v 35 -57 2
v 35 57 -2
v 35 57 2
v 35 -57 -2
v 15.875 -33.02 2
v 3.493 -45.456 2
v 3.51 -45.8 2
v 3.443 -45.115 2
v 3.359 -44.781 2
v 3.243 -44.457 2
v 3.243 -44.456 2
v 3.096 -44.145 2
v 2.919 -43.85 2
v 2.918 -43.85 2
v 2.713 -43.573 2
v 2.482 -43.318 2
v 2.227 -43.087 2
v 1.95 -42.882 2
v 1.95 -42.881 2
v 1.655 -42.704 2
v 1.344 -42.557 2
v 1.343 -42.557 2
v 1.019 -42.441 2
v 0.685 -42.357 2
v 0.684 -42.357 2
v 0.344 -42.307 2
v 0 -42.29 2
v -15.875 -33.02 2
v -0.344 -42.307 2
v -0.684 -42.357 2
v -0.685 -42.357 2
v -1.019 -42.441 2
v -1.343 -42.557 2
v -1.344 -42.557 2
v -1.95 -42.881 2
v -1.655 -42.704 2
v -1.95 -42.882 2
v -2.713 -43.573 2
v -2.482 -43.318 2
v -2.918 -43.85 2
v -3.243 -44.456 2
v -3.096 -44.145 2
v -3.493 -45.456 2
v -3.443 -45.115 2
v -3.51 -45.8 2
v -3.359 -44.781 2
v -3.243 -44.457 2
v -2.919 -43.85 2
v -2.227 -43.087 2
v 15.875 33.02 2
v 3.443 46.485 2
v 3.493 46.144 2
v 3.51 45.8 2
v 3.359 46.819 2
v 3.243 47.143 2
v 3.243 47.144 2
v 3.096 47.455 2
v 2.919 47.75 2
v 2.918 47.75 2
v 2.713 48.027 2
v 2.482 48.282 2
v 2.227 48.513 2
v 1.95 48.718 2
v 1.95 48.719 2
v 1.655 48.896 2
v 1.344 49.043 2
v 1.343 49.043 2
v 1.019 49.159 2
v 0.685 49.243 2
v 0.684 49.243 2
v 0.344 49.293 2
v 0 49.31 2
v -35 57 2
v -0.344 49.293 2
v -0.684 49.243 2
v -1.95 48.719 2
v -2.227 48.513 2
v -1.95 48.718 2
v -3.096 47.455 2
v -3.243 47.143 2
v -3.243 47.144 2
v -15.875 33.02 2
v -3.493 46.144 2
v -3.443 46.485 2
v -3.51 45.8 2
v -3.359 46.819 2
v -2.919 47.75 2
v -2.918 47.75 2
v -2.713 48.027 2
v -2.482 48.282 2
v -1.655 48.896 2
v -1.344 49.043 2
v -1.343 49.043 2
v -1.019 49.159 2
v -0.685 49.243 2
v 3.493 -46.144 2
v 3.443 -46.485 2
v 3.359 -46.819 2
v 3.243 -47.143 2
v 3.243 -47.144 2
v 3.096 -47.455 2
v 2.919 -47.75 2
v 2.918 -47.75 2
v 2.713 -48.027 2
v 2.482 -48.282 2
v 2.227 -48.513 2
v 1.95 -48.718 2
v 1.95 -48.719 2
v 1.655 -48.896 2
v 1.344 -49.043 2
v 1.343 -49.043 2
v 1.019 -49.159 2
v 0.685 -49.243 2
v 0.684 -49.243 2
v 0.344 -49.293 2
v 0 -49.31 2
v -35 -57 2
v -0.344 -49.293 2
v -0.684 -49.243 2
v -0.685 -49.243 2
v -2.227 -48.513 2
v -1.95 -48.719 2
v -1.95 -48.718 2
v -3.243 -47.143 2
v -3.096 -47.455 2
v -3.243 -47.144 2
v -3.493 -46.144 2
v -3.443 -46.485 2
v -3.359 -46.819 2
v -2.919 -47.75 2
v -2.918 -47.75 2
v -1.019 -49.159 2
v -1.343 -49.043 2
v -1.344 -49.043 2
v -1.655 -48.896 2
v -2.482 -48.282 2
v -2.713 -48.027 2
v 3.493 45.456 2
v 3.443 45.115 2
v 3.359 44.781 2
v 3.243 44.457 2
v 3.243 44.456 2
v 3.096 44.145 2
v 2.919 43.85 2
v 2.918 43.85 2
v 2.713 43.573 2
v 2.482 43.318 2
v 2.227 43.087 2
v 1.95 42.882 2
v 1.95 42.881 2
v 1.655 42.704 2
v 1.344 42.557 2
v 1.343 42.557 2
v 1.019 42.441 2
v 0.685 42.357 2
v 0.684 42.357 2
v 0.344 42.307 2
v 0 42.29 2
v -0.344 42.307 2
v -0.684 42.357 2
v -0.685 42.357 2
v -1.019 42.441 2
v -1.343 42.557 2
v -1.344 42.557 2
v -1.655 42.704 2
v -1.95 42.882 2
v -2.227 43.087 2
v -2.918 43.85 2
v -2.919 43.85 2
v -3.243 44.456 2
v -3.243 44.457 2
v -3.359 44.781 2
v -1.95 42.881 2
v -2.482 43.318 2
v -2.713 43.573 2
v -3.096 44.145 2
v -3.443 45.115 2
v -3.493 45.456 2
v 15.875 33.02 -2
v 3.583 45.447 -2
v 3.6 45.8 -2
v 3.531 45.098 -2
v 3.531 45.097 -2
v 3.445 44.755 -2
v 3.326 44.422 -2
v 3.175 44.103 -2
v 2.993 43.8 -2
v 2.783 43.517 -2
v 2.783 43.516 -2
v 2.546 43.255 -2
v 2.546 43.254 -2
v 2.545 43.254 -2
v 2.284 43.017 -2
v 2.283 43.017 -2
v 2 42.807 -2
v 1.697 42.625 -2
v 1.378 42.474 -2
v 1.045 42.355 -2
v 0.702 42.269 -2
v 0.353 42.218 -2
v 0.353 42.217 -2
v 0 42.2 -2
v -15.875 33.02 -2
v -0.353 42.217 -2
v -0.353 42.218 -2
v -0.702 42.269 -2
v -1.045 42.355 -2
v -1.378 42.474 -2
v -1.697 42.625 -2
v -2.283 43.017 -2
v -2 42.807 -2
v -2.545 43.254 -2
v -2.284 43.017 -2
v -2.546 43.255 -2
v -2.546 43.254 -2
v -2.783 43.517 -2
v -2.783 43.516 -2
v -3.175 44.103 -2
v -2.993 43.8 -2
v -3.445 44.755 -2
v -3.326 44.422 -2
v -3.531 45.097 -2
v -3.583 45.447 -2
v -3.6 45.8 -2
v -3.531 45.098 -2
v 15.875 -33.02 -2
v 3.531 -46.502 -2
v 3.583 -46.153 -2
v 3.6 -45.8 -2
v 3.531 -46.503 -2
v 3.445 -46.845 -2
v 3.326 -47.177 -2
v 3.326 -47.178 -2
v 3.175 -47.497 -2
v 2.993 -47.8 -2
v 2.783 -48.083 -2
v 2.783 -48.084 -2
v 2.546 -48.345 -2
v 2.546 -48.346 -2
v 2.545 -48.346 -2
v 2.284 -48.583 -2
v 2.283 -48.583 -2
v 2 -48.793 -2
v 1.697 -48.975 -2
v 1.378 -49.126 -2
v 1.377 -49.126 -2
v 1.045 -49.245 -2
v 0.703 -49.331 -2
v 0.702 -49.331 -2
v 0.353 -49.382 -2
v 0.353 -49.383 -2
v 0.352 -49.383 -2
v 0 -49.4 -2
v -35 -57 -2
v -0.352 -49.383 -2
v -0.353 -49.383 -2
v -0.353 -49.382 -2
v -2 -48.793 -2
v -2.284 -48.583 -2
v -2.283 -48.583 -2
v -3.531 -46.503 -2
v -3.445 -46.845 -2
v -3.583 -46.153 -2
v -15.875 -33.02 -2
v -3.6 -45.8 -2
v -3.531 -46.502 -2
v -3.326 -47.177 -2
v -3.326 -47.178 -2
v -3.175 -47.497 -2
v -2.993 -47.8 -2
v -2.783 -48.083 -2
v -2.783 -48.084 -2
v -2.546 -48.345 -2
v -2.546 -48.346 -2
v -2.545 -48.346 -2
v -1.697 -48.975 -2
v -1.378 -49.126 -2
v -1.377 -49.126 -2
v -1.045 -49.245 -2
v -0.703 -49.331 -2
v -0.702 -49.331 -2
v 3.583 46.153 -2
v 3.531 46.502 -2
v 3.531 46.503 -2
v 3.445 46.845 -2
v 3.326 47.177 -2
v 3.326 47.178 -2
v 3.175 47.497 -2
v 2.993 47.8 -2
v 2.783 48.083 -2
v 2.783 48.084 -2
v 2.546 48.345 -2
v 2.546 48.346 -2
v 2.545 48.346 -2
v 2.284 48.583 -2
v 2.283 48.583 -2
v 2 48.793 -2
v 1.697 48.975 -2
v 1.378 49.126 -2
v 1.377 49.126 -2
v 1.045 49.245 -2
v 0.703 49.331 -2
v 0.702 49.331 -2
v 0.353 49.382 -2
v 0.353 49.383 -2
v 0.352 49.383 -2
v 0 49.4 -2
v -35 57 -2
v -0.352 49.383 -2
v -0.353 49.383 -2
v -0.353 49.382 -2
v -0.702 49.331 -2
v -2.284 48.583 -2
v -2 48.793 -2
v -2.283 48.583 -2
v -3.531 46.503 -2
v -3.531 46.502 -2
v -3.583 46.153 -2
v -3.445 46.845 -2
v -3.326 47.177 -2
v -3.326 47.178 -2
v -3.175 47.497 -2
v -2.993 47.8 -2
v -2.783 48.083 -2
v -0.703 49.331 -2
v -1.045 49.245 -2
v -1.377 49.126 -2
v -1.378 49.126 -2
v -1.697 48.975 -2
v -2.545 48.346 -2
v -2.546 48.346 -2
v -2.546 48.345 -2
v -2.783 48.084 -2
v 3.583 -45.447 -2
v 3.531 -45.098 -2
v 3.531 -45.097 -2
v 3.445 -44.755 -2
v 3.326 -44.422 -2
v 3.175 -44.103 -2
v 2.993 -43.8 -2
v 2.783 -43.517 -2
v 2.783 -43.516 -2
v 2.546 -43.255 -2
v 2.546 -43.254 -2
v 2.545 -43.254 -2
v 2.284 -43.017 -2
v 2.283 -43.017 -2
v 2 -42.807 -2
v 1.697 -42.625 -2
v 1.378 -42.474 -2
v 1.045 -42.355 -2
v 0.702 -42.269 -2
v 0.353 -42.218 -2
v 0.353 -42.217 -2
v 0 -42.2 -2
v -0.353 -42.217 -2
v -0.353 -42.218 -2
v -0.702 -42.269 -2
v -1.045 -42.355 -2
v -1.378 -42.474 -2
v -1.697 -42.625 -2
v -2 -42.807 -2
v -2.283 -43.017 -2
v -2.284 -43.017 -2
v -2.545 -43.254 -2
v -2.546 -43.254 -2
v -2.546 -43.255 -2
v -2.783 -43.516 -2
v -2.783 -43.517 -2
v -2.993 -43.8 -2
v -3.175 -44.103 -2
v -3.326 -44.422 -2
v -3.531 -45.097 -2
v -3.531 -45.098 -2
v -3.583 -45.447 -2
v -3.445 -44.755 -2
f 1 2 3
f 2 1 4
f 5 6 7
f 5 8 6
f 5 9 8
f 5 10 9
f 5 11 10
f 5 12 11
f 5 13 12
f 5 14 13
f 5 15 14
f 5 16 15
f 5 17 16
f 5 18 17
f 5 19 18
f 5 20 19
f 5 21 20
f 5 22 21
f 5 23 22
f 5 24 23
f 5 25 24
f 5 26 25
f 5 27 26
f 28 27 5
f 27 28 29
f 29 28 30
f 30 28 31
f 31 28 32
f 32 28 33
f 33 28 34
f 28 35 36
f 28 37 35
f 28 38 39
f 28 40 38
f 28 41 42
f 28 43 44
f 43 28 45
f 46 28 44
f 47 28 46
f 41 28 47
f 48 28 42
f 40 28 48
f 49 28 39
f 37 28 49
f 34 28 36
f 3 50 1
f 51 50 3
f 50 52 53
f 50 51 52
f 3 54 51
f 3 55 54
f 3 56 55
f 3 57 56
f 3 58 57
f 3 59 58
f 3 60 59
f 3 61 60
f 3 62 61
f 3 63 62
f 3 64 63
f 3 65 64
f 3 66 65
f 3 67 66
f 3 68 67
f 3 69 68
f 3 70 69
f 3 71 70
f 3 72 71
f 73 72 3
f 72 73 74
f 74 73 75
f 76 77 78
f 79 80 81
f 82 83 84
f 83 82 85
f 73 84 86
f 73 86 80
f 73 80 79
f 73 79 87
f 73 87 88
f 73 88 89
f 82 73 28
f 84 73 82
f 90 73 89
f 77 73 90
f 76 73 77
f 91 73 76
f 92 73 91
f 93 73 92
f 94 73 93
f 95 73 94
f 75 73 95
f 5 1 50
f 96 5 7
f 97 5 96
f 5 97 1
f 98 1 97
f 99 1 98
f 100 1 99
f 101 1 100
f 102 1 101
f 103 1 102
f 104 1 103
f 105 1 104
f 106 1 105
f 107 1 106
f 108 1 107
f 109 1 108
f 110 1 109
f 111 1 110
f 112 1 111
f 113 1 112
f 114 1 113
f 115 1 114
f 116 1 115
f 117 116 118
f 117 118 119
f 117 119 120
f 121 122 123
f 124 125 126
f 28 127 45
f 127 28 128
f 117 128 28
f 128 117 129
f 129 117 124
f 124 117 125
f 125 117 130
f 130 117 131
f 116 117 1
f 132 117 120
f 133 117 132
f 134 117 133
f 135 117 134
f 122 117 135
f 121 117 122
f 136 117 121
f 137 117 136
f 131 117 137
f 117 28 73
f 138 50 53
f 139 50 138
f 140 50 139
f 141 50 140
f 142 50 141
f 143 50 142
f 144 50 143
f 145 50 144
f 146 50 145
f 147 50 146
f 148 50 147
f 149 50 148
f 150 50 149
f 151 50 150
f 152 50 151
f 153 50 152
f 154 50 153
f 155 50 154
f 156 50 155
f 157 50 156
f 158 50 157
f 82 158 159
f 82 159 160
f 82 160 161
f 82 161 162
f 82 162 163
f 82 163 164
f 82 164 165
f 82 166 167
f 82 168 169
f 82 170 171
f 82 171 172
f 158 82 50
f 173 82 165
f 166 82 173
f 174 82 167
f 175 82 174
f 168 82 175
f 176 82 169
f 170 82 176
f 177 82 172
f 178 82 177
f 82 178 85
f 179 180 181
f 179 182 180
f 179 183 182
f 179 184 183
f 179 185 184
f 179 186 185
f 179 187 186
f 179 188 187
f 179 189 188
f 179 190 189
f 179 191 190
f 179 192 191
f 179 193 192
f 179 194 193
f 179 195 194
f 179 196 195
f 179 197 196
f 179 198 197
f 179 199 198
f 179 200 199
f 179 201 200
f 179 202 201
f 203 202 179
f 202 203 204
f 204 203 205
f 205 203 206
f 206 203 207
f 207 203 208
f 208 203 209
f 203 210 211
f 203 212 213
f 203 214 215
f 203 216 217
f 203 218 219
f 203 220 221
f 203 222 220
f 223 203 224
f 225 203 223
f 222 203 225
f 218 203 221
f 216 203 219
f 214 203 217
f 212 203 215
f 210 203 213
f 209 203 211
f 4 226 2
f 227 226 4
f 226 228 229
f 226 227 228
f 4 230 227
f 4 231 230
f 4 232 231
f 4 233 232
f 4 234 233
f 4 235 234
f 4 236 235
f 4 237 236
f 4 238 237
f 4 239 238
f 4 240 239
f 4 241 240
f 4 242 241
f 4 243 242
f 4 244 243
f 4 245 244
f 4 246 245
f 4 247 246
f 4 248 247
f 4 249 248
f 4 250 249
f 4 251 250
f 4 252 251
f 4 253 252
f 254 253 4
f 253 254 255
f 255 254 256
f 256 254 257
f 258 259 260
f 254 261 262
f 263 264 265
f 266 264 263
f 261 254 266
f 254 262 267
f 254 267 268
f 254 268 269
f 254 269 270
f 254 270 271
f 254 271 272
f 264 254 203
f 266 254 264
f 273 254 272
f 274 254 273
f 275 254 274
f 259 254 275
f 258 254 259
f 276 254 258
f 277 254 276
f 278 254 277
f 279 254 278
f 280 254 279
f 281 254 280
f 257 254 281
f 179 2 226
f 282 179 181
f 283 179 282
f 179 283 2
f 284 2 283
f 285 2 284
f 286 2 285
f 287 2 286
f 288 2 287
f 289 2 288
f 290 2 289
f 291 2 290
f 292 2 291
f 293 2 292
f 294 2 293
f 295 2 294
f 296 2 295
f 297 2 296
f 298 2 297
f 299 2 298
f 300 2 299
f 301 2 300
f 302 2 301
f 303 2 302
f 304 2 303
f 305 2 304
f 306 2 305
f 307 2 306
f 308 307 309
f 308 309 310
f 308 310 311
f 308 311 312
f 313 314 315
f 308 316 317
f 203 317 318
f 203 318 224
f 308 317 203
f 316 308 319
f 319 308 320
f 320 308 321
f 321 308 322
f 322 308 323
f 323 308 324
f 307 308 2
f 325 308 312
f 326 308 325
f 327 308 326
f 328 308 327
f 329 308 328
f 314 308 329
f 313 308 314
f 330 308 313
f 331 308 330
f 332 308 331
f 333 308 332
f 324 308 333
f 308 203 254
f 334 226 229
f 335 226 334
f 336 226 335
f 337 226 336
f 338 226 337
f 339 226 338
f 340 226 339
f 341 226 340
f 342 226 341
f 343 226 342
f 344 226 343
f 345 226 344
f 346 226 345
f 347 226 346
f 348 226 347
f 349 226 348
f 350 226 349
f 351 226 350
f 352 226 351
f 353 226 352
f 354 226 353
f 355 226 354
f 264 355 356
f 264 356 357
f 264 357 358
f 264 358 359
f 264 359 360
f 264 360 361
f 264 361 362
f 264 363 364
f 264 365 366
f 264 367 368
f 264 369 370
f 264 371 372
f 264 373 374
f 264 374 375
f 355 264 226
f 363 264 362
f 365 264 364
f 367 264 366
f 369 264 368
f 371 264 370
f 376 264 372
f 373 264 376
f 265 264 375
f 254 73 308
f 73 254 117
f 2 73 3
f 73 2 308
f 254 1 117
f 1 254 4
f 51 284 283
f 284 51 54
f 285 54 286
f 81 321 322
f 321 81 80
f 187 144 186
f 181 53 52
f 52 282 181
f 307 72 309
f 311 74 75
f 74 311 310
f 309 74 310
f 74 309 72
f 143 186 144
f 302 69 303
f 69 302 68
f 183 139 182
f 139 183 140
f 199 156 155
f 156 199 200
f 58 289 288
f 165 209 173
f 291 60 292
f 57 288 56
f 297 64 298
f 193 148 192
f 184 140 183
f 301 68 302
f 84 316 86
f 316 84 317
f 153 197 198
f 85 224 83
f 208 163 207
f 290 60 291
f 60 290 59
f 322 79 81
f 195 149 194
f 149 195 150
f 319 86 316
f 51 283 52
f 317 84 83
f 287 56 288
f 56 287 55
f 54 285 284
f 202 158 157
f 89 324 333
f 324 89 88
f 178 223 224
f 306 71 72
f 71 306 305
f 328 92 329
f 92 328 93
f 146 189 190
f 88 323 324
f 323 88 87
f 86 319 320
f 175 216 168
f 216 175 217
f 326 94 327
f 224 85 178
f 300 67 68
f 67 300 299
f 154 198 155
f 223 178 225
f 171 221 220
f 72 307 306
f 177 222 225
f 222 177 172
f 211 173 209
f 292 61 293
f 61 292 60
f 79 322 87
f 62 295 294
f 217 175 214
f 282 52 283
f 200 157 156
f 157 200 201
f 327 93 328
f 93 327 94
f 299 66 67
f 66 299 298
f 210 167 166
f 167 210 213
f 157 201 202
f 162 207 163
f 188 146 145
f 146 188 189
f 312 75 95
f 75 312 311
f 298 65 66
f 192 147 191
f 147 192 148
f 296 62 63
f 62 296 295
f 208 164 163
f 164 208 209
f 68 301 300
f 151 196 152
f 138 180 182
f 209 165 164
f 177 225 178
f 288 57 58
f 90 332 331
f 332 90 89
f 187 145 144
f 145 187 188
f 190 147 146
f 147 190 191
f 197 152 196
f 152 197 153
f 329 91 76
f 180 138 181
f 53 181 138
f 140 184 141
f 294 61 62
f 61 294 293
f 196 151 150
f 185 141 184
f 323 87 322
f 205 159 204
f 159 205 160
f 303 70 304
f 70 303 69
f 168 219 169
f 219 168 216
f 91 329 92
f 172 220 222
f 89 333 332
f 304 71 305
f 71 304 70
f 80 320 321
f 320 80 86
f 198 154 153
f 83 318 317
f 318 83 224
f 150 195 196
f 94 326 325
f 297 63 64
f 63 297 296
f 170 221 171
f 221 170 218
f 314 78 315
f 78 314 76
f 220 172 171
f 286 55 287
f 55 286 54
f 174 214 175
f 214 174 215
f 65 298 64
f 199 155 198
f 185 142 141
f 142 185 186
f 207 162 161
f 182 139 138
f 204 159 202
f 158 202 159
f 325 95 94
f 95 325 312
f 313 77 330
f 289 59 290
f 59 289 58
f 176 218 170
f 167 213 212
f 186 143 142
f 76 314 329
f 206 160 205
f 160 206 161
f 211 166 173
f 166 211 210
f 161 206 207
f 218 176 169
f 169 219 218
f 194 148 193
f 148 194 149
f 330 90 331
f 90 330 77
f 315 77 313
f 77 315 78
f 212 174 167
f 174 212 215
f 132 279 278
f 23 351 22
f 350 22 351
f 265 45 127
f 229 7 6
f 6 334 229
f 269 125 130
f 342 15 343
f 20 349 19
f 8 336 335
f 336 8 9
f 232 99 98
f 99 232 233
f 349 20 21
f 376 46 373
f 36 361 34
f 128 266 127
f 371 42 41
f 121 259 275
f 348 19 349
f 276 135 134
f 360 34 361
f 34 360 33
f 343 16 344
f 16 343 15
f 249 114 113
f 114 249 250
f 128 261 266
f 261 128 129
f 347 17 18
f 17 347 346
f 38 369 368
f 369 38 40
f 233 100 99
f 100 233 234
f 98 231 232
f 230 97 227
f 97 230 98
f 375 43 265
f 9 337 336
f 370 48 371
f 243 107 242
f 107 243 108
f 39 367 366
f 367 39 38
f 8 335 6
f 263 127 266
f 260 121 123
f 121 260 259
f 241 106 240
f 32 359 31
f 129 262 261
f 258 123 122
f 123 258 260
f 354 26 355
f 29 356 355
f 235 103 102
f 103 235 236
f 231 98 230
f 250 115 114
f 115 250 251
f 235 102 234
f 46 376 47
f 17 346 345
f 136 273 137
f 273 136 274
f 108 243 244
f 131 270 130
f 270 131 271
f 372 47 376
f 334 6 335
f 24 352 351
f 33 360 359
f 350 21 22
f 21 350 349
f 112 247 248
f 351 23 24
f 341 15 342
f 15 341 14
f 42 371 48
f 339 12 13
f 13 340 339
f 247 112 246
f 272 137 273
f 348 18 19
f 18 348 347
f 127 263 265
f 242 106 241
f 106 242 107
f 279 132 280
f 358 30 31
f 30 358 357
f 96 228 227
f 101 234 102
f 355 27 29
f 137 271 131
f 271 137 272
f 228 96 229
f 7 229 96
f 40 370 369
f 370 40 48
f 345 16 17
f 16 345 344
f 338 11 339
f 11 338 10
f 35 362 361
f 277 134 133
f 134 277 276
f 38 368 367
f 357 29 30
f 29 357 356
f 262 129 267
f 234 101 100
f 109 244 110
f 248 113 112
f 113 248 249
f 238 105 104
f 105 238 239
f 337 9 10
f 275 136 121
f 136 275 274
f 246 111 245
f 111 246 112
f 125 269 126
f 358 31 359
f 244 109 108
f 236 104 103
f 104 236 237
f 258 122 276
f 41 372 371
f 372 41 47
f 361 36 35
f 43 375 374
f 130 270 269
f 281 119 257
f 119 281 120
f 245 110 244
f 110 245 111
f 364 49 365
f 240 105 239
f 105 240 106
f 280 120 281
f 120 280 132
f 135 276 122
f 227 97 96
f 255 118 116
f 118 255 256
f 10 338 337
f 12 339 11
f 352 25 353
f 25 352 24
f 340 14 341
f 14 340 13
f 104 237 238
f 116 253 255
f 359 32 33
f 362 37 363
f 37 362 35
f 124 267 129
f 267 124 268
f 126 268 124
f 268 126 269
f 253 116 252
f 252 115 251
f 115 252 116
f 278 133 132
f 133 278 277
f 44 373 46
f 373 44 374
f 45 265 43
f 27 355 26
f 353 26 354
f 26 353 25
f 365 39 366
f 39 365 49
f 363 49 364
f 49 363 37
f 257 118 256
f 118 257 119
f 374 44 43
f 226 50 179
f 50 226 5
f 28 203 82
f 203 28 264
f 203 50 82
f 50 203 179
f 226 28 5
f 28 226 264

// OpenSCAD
// Global Options
$fn = 64;

// Options
plateThickness = 4;

// Tube
difference()
{
    cube([70, 114, plateThickness], center=true);
    translate([0, 45.8, 0])
    {
        cylinder(plateThickness + 0.01, 3.6, 3.51, center=true);
    }
    translate([0, -45.8, 0])
    {
        cylinder(plateThickness + 0.01, 3.6, 3.51, center=true);
    }
    cube([31.75, 66.04, plateThickness + 0.01], center=true);
}
